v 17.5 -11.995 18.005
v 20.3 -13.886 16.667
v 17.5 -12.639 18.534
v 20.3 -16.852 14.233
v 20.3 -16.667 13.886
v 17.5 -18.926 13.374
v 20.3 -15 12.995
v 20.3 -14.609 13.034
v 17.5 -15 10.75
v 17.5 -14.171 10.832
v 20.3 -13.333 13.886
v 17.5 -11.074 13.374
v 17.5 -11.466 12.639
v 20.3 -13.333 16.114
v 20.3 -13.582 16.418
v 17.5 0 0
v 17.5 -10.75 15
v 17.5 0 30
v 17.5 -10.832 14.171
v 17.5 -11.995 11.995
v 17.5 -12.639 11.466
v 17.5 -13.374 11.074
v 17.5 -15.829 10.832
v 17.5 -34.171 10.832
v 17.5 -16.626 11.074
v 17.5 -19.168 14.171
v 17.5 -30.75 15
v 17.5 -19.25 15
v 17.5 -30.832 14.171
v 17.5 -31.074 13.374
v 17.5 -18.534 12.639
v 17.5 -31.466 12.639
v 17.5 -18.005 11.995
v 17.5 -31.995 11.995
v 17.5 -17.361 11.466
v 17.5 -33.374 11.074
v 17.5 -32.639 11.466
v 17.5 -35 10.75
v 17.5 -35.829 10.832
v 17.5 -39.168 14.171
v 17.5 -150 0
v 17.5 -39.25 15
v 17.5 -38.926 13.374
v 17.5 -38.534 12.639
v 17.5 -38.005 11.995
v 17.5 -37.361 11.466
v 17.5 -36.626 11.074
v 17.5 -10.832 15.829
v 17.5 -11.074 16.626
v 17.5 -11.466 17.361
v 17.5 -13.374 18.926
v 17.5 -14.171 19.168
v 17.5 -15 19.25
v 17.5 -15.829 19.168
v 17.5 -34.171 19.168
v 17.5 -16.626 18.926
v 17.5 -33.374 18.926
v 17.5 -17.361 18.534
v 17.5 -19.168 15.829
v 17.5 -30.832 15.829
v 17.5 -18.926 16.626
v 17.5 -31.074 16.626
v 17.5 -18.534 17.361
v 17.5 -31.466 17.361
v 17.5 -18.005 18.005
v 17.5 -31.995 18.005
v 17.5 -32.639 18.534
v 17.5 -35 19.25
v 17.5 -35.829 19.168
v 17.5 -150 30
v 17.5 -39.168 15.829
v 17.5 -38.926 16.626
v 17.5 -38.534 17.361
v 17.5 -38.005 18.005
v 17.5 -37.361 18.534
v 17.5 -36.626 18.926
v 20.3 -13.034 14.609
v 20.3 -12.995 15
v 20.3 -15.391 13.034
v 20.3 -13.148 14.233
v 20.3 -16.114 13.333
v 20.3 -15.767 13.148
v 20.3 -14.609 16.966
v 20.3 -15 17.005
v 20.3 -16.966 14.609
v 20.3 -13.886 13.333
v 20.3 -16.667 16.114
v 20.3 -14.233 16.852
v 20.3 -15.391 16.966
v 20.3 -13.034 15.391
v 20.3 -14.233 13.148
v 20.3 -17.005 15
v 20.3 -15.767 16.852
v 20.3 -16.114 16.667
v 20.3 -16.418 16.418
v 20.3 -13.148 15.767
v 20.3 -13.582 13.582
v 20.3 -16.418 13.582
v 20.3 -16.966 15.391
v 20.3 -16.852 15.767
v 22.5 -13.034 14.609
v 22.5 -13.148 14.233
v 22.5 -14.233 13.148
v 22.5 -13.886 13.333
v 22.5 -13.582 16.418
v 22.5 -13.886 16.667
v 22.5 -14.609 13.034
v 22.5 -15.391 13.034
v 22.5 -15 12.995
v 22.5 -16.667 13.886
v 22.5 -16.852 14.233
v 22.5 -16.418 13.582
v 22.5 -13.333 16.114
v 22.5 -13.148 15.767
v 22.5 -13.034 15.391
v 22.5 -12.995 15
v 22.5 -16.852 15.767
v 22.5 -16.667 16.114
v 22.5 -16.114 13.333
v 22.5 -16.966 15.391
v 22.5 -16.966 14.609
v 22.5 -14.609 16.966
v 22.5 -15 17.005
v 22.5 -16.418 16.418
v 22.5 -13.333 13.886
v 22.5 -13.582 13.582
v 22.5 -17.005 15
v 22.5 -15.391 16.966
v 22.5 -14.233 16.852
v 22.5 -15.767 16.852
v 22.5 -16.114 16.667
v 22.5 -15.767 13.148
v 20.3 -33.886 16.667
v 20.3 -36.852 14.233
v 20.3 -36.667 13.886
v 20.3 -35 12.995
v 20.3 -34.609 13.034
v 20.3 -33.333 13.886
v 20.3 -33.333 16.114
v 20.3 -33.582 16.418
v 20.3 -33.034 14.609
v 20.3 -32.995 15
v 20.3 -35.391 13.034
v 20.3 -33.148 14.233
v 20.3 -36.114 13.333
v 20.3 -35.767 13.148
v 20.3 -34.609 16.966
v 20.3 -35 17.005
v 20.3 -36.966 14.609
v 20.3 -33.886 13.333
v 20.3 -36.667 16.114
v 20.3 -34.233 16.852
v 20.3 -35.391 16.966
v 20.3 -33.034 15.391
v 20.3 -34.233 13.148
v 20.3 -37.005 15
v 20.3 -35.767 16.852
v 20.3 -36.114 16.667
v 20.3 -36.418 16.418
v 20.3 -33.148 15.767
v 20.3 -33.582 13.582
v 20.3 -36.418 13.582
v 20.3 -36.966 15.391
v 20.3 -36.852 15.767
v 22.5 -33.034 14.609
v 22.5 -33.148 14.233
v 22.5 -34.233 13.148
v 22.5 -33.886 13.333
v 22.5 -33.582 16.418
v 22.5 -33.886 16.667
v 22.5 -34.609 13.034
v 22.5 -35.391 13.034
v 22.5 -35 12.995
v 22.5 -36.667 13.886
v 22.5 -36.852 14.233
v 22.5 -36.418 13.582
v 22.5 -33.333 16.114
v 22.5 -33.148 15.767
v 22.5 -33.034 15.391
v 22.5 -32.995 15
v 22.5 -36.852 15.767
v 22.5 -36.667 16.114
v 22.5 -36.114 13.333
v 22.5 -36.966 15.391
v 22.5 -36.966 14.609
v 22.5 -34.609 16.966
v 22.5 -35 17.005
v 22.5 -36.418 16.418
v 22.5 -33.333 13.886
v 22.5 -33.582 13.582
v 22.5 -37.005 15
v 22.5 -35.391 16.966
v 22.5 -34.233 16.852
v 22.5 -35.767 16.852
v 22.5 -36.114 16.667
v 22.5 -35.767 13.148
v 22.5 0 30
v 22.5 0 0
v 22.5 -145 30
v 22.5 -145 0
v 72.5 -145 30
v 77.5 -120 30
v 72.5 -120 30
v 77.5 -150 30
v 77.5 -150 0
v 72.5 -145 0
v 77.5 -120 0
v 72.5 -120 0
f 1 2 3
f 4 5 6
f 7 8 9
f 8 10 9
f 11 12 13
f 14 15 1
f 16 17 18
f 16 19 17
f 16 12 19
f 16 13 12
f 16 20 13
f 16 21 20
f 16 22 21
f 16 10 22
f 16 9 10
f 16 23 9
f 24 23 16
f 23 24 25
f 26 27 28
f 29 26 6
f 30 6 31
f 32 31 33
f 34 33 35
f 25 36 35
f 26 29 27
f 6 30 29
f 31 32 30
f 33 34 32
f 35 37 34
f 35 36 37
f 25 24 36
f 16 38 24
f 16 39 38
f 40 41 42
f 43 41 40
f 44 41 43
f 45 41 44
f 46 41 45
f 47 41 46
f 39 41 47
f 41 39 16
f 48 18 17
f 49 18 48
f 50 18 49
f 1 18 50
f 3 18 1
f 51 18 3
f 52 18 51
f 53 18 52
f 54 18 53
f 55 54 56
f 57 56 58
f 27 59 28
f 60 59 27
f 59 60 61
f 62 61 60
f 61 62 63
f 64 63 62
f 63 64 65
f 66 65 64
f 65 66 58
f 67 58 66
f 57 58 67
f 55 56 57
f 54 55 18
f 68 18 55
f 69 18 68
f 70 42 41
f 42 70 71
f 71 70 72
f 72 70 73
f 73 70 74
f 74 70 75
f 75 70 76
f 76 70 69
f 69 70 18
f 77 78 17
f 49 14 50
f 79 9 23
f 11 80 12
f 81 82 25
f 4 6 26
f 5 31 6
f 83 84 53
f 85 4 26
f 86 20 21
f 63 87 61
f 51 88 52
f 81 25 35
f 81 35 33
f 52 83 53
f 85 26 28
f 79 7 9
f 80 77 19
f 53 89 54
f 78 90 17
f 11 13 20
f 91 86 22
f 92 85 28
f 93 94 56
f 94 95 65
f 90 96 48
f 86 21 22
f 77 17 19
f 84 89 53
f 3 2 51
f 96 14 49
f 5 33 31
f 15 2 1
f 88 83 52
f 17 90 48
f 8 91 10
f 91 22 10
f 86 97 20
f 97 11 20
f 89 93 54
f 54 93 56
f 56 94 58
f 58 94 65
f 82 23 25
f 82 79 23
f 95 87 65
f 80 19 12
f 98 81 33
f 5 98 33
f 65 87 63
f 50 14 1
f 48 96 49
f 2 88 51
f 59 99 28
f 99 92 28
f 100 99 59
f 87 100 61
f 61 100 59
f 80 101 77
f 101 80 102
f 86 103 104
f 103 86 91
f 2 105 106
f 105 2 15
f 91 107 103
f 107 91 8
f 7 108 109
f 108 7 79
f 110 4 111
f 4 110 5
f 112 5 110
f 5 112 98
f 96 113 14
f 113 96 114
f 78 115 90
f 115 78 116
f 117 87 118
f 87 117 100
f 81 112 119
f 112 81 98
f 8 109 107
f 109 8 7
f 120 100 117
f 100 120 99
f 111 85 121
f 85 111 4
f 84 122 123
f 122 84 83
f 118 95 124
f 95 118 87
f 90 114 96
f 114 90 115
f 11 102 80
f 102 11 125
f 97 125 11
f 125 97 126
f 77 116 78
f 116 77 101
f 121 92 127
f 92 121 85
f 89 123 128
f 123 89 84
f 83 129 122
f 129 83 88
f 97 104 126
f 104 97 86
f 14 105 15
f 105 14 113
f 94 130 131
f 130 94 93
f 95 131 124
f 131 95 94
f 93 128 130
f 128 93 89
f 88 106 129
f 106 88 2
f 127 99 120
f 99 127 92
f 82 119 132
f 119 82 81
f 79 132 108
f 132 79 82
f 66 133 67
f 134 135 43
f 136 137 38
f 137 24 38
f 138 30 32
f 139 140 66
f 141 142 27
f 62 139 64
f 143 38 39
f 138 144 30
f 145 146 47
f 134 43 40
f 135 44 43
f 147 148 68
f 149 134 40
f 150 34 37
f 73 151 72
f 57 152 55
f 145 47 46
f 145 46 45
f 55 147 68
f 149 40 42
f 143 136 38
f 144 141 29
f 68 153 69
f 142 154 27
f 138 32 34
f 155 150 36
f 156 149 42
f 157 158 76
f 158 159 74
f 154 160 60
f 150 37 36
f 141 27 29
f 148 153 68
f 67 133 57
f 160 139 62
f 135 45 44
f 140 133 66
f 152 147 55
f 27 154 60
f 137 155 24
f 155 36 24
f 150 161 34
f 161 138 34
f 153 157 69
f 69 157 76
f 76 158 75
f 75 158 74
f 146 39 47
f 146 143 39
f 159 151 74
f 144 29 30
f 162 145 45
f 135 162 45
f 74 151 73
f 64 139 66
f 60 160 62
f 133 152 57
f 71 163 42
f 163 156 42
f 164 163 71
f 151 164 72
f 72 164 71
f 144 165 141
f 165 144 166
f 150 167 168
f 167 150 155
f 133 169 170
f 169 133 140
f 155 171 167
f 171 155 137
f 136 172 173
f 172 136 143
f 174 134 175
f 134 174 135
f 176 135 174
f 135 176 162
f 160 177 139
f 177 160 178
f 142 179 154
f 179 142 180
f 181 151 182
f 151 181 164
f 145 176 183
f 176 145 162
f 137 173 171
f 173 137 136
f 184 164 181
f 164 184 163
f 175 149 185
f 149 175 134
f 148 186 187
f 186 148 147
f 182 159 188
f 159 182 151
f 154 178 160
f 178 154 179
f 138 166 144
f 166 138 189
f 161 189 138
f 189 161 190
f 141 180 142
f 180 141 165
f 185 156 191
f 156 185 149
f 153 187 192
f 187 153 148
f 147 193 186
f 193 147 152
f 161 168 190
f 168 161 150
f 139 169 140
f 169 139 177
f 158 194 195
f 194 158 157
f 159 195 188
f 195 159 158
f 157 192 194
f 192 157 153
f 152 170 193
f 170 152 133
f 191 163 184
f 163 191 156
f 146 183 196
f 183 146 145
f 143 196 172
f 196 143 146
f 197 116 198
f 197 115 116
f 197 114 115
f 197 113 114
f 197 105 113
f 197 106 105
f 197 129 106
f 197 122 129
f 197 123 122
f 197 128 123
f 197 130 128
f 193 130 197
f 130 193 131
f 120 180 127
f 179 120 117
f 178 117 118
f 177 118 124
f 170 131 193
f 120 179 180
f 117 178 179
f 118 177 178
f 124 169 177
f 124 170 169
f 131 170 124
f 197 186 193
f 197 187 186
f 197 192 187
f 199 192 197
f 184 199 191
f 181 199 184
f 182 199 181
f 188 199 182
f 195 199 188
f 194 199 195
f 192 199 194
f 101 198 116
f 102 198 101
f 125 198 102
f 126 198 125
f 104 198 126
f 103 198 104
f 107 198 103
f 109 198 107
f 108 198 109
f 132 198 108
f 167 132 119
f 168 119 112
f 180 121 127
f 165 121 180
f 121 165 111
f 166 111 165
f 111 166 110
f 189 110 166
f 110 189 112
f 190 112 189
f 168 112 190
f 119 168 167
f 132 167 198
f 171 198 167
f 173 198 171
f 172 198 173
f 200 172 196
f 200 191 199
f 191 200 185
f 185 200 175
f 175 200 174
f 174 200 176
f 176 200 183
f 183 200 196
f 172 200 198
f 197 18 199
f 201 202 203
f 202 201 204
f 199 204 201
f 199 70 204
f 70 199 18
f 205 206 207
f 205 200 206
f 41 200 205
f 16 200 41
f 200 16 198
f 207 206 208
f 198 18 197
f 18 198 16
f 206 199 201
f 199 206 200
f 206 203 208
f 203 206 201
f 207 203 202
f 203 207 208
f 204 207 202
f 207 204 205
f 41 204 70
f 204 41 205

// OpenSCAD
// file: ScrewLibrary.scad
// Screw hole library

// Declare the supported screws here

// To add new screws, define the 5 values below, and add
// code to the IsScrewSupported() and ScrewHeadHeight() function
    
// spec is based on "traditional" wood screws
US5FlatStr = "US#5 Flat";
US5FlatHeadHeight = 2.8;    // caliper
US5FlatHeadDiameter = 6.35; // head bore 1/4
US5FlatDiameter = 3.18;    // major diameter 1/8
US5FlatClearance = 0.5;

/* ad hoc measured by caliper
US5FlatHeadHeight = 2.8;
US5FlatHeadDiameter = 5.8;
US5FlatDiameter = 3.2;
US5FlatClearance = 0.5;
*/

US6FlatStr = "US#6 Flat";
US6FlatHeadHeight = 2.8; // A caliper
US6FlatHeadDiameter = 8.0; // head bore 9/32
US6FlatDiameter = 3.51;     // major dia. 0.138"
US6FlatClearance = 0.5;

US8FlatStr = "US#8 Flat"; 
US8FlatHeadHeight = 3.6;
US8FlatHeadDiameter = 8.73; // head bore 11/32
US8FlatDiameter = 4.17;     // major dia. 0.164"
US8FlatClearance = 0.5;

US8RoundStr = "US#8 Round"; 
US8RoundHeadHeight = 1; // keep a slight slope for easy printing
US8RoundHeadDiameter = 8.73; // head bore 11/32
US8RoundDiameter = 4.17;     // major dia. 0.164"
US8RoundClearance = 0.5;

CustomScrewStr = "custom";

// Utilities
module CreateScrewHole(height=15,diameter=3.3) {
    // height is the hypothetical screw height. It
    // can be anything as long as it penetrates the
    // object we are modelling. So 15mm is plenty
    $fn=32;
    translate([0, 0, height / 2])
        cylinder(height, diameter / 2, diameter / 2, center = true);
}

module CreateFlatHead(headsize = 5.9, bodysize = 3.3, height = 2.8) {
    $fn=32;
    translate([0, 0, height / 2])
        cylinder(height, headsize / 2, bodysize / 2, center = true);
}

module CreateHeadHole(headsize = 5.9, head_hole_length = 0) {
    $fn=32;
    r = headsize / 2;
    translate([0, 0, - head_hole_length / 2])
        cylinder(head_hole_length, r, r, true);
}

/* old code 
module US5FlatScrew(screw_length=15,head_hole_length=0) {
    // measurement is 5.8 (head) and 3.2 (body), use 5.9 and 3.3 for some room
    hd = US5FlatHeadDiameter + US5Clearance;
    sd = US5ScrewDiameter + US5Clearance;
    
    union(){
        if(head_hole_length > 0) {
            CreateHeadHole(hd, head_hole_length);
        }
        CreateFlatHead(hd, sd, US5FlatHeadHeight);
        CreateScrewHole(screw_length+US5FlatHeadHeight, sd);
    }
}
*/

module CreateScrewRAW(
    screw_length,
    head_hole_length,
    head_diameter,
    flat_head_height,
    screw_diameter)
{
    // the parameters should be already adjusted by clearance    
    union(){        
        CreateHeadHole(head_diameter, head_hole_length);
  
        CreateFlatHead(head_diameter, 
                screw_diameter, flat_head_height);
        
        CreateScrewHole(screw_length, screw_diameter);
    }
}        

// Public interface
function IsScrewSupported(style) =
    style == US5FlatStr ||
    style == US6FlatStr ||
    style == US8FlatStr ||
    style == US8RoundStr ||
    style == CustomScrewStr;
    
function ScrewHeadHeight(style) =
    style == US5FlatStr ? US5FlatHeadHeight :
      style == US6FlatStr ? US6FlatHeadHeight :
      style == US8FlatStr ? US8FlatHeadHeight : 
      style == US8RoundStr ? US8RoundHeadHeight : 0;

module CreateScrew(
    style="", 
    screw_length=15, 
    head_hole_length=0,
    custom_screw_head_height=0, // this and below only needed for custom screw size
    custom_screw_head_diameter=0,
    custom_screw_diameter=0,
    custom_screw_clearance=0
    ) {        
    assert(IsScrewSupported(style));
    
    if (style==US5FlatStr) {
        CreateScrewRAW(
            screw_length,
            head_hole_length,
            US5FlatHeadDiameter + US5FlatClearance,
            US5FlatHeadHeight,
            US5FlatDiameter + US5FlatClearance
        );
    }
    else if (style==US6FlatStr) {
        CreateScrewRAW(
            screw_length,
            head_hole_length,
            US6FlatHeadDiameter + US6FlatClearance,
            US6FlatHeadHeight,
            US6FlatDiameter + US6FlatClearance
        );
    } else if (style == US8FlatStr) {
        CreateScrewRAW(
            screw_length,
            head_hole_length,
            US8FlatHeadDiameter + US8FlatClearance,
            US8FlatHeadHeight,
            US8FlatDiameter + US8FlatClearance
        );
    } else if (style == US8RoundStr) {
        CreateScrewRAW(
            screw_length,
            head_hole_length,
            US8RoundHeadDiameter + US8RoundClearance,
            US8RoundHeadHeight,
            US8RoundDiameter + US8RoundClearance
        );
    } else if (style == CustomScrewStr) {
        CreateScrewRAW(
            screw_length,
            head_hole_length,
            custom_screw_diameter + custom_screw_clearance,
            custom_screw_head_height,
            custom_screw_diameter + custom_screw_clearance
        );
    } else assert(false);
} // end CreateScrew    

//testing
// CreateScrew(US5FlatStr, 15, 20);
// CreateScrew(US6FlatStr, 15, 20);
// CreateScrew(US8FlatStr, 15, 20);
// CreateScrew(US8RoundStr, 15, 20);
// CreateScrew("Unsupported", 15, 20);
         
       
// main file
include <ScrewLibrary.scad>

module u_shape(iwidth=12.5){
u_profile=[[0,0],[0,30],[5+iwidth+5,30],
    [5+iwidth+5,0],
  [5+iwidth,0], [5+iwidth,25],[5,25],[5,0]];
linear_extrude(30)
    polygon(u_profile);
}

// u_shape(iwidth=12.5);

translate([12.5+5,-120,30])
rotate([180,0,0])
    u_shape(iwidth=50);



translate([5+12.5,-120,0])
difference(){
cube([5,120,30]);
translate([0,105,15])
    rotate([0,90,0])
    CreateScrew(US6FlatStr);
translate([0,85,15])
    rotate([0,90,0])
    CreateScrew(US6FlatStr);
}
